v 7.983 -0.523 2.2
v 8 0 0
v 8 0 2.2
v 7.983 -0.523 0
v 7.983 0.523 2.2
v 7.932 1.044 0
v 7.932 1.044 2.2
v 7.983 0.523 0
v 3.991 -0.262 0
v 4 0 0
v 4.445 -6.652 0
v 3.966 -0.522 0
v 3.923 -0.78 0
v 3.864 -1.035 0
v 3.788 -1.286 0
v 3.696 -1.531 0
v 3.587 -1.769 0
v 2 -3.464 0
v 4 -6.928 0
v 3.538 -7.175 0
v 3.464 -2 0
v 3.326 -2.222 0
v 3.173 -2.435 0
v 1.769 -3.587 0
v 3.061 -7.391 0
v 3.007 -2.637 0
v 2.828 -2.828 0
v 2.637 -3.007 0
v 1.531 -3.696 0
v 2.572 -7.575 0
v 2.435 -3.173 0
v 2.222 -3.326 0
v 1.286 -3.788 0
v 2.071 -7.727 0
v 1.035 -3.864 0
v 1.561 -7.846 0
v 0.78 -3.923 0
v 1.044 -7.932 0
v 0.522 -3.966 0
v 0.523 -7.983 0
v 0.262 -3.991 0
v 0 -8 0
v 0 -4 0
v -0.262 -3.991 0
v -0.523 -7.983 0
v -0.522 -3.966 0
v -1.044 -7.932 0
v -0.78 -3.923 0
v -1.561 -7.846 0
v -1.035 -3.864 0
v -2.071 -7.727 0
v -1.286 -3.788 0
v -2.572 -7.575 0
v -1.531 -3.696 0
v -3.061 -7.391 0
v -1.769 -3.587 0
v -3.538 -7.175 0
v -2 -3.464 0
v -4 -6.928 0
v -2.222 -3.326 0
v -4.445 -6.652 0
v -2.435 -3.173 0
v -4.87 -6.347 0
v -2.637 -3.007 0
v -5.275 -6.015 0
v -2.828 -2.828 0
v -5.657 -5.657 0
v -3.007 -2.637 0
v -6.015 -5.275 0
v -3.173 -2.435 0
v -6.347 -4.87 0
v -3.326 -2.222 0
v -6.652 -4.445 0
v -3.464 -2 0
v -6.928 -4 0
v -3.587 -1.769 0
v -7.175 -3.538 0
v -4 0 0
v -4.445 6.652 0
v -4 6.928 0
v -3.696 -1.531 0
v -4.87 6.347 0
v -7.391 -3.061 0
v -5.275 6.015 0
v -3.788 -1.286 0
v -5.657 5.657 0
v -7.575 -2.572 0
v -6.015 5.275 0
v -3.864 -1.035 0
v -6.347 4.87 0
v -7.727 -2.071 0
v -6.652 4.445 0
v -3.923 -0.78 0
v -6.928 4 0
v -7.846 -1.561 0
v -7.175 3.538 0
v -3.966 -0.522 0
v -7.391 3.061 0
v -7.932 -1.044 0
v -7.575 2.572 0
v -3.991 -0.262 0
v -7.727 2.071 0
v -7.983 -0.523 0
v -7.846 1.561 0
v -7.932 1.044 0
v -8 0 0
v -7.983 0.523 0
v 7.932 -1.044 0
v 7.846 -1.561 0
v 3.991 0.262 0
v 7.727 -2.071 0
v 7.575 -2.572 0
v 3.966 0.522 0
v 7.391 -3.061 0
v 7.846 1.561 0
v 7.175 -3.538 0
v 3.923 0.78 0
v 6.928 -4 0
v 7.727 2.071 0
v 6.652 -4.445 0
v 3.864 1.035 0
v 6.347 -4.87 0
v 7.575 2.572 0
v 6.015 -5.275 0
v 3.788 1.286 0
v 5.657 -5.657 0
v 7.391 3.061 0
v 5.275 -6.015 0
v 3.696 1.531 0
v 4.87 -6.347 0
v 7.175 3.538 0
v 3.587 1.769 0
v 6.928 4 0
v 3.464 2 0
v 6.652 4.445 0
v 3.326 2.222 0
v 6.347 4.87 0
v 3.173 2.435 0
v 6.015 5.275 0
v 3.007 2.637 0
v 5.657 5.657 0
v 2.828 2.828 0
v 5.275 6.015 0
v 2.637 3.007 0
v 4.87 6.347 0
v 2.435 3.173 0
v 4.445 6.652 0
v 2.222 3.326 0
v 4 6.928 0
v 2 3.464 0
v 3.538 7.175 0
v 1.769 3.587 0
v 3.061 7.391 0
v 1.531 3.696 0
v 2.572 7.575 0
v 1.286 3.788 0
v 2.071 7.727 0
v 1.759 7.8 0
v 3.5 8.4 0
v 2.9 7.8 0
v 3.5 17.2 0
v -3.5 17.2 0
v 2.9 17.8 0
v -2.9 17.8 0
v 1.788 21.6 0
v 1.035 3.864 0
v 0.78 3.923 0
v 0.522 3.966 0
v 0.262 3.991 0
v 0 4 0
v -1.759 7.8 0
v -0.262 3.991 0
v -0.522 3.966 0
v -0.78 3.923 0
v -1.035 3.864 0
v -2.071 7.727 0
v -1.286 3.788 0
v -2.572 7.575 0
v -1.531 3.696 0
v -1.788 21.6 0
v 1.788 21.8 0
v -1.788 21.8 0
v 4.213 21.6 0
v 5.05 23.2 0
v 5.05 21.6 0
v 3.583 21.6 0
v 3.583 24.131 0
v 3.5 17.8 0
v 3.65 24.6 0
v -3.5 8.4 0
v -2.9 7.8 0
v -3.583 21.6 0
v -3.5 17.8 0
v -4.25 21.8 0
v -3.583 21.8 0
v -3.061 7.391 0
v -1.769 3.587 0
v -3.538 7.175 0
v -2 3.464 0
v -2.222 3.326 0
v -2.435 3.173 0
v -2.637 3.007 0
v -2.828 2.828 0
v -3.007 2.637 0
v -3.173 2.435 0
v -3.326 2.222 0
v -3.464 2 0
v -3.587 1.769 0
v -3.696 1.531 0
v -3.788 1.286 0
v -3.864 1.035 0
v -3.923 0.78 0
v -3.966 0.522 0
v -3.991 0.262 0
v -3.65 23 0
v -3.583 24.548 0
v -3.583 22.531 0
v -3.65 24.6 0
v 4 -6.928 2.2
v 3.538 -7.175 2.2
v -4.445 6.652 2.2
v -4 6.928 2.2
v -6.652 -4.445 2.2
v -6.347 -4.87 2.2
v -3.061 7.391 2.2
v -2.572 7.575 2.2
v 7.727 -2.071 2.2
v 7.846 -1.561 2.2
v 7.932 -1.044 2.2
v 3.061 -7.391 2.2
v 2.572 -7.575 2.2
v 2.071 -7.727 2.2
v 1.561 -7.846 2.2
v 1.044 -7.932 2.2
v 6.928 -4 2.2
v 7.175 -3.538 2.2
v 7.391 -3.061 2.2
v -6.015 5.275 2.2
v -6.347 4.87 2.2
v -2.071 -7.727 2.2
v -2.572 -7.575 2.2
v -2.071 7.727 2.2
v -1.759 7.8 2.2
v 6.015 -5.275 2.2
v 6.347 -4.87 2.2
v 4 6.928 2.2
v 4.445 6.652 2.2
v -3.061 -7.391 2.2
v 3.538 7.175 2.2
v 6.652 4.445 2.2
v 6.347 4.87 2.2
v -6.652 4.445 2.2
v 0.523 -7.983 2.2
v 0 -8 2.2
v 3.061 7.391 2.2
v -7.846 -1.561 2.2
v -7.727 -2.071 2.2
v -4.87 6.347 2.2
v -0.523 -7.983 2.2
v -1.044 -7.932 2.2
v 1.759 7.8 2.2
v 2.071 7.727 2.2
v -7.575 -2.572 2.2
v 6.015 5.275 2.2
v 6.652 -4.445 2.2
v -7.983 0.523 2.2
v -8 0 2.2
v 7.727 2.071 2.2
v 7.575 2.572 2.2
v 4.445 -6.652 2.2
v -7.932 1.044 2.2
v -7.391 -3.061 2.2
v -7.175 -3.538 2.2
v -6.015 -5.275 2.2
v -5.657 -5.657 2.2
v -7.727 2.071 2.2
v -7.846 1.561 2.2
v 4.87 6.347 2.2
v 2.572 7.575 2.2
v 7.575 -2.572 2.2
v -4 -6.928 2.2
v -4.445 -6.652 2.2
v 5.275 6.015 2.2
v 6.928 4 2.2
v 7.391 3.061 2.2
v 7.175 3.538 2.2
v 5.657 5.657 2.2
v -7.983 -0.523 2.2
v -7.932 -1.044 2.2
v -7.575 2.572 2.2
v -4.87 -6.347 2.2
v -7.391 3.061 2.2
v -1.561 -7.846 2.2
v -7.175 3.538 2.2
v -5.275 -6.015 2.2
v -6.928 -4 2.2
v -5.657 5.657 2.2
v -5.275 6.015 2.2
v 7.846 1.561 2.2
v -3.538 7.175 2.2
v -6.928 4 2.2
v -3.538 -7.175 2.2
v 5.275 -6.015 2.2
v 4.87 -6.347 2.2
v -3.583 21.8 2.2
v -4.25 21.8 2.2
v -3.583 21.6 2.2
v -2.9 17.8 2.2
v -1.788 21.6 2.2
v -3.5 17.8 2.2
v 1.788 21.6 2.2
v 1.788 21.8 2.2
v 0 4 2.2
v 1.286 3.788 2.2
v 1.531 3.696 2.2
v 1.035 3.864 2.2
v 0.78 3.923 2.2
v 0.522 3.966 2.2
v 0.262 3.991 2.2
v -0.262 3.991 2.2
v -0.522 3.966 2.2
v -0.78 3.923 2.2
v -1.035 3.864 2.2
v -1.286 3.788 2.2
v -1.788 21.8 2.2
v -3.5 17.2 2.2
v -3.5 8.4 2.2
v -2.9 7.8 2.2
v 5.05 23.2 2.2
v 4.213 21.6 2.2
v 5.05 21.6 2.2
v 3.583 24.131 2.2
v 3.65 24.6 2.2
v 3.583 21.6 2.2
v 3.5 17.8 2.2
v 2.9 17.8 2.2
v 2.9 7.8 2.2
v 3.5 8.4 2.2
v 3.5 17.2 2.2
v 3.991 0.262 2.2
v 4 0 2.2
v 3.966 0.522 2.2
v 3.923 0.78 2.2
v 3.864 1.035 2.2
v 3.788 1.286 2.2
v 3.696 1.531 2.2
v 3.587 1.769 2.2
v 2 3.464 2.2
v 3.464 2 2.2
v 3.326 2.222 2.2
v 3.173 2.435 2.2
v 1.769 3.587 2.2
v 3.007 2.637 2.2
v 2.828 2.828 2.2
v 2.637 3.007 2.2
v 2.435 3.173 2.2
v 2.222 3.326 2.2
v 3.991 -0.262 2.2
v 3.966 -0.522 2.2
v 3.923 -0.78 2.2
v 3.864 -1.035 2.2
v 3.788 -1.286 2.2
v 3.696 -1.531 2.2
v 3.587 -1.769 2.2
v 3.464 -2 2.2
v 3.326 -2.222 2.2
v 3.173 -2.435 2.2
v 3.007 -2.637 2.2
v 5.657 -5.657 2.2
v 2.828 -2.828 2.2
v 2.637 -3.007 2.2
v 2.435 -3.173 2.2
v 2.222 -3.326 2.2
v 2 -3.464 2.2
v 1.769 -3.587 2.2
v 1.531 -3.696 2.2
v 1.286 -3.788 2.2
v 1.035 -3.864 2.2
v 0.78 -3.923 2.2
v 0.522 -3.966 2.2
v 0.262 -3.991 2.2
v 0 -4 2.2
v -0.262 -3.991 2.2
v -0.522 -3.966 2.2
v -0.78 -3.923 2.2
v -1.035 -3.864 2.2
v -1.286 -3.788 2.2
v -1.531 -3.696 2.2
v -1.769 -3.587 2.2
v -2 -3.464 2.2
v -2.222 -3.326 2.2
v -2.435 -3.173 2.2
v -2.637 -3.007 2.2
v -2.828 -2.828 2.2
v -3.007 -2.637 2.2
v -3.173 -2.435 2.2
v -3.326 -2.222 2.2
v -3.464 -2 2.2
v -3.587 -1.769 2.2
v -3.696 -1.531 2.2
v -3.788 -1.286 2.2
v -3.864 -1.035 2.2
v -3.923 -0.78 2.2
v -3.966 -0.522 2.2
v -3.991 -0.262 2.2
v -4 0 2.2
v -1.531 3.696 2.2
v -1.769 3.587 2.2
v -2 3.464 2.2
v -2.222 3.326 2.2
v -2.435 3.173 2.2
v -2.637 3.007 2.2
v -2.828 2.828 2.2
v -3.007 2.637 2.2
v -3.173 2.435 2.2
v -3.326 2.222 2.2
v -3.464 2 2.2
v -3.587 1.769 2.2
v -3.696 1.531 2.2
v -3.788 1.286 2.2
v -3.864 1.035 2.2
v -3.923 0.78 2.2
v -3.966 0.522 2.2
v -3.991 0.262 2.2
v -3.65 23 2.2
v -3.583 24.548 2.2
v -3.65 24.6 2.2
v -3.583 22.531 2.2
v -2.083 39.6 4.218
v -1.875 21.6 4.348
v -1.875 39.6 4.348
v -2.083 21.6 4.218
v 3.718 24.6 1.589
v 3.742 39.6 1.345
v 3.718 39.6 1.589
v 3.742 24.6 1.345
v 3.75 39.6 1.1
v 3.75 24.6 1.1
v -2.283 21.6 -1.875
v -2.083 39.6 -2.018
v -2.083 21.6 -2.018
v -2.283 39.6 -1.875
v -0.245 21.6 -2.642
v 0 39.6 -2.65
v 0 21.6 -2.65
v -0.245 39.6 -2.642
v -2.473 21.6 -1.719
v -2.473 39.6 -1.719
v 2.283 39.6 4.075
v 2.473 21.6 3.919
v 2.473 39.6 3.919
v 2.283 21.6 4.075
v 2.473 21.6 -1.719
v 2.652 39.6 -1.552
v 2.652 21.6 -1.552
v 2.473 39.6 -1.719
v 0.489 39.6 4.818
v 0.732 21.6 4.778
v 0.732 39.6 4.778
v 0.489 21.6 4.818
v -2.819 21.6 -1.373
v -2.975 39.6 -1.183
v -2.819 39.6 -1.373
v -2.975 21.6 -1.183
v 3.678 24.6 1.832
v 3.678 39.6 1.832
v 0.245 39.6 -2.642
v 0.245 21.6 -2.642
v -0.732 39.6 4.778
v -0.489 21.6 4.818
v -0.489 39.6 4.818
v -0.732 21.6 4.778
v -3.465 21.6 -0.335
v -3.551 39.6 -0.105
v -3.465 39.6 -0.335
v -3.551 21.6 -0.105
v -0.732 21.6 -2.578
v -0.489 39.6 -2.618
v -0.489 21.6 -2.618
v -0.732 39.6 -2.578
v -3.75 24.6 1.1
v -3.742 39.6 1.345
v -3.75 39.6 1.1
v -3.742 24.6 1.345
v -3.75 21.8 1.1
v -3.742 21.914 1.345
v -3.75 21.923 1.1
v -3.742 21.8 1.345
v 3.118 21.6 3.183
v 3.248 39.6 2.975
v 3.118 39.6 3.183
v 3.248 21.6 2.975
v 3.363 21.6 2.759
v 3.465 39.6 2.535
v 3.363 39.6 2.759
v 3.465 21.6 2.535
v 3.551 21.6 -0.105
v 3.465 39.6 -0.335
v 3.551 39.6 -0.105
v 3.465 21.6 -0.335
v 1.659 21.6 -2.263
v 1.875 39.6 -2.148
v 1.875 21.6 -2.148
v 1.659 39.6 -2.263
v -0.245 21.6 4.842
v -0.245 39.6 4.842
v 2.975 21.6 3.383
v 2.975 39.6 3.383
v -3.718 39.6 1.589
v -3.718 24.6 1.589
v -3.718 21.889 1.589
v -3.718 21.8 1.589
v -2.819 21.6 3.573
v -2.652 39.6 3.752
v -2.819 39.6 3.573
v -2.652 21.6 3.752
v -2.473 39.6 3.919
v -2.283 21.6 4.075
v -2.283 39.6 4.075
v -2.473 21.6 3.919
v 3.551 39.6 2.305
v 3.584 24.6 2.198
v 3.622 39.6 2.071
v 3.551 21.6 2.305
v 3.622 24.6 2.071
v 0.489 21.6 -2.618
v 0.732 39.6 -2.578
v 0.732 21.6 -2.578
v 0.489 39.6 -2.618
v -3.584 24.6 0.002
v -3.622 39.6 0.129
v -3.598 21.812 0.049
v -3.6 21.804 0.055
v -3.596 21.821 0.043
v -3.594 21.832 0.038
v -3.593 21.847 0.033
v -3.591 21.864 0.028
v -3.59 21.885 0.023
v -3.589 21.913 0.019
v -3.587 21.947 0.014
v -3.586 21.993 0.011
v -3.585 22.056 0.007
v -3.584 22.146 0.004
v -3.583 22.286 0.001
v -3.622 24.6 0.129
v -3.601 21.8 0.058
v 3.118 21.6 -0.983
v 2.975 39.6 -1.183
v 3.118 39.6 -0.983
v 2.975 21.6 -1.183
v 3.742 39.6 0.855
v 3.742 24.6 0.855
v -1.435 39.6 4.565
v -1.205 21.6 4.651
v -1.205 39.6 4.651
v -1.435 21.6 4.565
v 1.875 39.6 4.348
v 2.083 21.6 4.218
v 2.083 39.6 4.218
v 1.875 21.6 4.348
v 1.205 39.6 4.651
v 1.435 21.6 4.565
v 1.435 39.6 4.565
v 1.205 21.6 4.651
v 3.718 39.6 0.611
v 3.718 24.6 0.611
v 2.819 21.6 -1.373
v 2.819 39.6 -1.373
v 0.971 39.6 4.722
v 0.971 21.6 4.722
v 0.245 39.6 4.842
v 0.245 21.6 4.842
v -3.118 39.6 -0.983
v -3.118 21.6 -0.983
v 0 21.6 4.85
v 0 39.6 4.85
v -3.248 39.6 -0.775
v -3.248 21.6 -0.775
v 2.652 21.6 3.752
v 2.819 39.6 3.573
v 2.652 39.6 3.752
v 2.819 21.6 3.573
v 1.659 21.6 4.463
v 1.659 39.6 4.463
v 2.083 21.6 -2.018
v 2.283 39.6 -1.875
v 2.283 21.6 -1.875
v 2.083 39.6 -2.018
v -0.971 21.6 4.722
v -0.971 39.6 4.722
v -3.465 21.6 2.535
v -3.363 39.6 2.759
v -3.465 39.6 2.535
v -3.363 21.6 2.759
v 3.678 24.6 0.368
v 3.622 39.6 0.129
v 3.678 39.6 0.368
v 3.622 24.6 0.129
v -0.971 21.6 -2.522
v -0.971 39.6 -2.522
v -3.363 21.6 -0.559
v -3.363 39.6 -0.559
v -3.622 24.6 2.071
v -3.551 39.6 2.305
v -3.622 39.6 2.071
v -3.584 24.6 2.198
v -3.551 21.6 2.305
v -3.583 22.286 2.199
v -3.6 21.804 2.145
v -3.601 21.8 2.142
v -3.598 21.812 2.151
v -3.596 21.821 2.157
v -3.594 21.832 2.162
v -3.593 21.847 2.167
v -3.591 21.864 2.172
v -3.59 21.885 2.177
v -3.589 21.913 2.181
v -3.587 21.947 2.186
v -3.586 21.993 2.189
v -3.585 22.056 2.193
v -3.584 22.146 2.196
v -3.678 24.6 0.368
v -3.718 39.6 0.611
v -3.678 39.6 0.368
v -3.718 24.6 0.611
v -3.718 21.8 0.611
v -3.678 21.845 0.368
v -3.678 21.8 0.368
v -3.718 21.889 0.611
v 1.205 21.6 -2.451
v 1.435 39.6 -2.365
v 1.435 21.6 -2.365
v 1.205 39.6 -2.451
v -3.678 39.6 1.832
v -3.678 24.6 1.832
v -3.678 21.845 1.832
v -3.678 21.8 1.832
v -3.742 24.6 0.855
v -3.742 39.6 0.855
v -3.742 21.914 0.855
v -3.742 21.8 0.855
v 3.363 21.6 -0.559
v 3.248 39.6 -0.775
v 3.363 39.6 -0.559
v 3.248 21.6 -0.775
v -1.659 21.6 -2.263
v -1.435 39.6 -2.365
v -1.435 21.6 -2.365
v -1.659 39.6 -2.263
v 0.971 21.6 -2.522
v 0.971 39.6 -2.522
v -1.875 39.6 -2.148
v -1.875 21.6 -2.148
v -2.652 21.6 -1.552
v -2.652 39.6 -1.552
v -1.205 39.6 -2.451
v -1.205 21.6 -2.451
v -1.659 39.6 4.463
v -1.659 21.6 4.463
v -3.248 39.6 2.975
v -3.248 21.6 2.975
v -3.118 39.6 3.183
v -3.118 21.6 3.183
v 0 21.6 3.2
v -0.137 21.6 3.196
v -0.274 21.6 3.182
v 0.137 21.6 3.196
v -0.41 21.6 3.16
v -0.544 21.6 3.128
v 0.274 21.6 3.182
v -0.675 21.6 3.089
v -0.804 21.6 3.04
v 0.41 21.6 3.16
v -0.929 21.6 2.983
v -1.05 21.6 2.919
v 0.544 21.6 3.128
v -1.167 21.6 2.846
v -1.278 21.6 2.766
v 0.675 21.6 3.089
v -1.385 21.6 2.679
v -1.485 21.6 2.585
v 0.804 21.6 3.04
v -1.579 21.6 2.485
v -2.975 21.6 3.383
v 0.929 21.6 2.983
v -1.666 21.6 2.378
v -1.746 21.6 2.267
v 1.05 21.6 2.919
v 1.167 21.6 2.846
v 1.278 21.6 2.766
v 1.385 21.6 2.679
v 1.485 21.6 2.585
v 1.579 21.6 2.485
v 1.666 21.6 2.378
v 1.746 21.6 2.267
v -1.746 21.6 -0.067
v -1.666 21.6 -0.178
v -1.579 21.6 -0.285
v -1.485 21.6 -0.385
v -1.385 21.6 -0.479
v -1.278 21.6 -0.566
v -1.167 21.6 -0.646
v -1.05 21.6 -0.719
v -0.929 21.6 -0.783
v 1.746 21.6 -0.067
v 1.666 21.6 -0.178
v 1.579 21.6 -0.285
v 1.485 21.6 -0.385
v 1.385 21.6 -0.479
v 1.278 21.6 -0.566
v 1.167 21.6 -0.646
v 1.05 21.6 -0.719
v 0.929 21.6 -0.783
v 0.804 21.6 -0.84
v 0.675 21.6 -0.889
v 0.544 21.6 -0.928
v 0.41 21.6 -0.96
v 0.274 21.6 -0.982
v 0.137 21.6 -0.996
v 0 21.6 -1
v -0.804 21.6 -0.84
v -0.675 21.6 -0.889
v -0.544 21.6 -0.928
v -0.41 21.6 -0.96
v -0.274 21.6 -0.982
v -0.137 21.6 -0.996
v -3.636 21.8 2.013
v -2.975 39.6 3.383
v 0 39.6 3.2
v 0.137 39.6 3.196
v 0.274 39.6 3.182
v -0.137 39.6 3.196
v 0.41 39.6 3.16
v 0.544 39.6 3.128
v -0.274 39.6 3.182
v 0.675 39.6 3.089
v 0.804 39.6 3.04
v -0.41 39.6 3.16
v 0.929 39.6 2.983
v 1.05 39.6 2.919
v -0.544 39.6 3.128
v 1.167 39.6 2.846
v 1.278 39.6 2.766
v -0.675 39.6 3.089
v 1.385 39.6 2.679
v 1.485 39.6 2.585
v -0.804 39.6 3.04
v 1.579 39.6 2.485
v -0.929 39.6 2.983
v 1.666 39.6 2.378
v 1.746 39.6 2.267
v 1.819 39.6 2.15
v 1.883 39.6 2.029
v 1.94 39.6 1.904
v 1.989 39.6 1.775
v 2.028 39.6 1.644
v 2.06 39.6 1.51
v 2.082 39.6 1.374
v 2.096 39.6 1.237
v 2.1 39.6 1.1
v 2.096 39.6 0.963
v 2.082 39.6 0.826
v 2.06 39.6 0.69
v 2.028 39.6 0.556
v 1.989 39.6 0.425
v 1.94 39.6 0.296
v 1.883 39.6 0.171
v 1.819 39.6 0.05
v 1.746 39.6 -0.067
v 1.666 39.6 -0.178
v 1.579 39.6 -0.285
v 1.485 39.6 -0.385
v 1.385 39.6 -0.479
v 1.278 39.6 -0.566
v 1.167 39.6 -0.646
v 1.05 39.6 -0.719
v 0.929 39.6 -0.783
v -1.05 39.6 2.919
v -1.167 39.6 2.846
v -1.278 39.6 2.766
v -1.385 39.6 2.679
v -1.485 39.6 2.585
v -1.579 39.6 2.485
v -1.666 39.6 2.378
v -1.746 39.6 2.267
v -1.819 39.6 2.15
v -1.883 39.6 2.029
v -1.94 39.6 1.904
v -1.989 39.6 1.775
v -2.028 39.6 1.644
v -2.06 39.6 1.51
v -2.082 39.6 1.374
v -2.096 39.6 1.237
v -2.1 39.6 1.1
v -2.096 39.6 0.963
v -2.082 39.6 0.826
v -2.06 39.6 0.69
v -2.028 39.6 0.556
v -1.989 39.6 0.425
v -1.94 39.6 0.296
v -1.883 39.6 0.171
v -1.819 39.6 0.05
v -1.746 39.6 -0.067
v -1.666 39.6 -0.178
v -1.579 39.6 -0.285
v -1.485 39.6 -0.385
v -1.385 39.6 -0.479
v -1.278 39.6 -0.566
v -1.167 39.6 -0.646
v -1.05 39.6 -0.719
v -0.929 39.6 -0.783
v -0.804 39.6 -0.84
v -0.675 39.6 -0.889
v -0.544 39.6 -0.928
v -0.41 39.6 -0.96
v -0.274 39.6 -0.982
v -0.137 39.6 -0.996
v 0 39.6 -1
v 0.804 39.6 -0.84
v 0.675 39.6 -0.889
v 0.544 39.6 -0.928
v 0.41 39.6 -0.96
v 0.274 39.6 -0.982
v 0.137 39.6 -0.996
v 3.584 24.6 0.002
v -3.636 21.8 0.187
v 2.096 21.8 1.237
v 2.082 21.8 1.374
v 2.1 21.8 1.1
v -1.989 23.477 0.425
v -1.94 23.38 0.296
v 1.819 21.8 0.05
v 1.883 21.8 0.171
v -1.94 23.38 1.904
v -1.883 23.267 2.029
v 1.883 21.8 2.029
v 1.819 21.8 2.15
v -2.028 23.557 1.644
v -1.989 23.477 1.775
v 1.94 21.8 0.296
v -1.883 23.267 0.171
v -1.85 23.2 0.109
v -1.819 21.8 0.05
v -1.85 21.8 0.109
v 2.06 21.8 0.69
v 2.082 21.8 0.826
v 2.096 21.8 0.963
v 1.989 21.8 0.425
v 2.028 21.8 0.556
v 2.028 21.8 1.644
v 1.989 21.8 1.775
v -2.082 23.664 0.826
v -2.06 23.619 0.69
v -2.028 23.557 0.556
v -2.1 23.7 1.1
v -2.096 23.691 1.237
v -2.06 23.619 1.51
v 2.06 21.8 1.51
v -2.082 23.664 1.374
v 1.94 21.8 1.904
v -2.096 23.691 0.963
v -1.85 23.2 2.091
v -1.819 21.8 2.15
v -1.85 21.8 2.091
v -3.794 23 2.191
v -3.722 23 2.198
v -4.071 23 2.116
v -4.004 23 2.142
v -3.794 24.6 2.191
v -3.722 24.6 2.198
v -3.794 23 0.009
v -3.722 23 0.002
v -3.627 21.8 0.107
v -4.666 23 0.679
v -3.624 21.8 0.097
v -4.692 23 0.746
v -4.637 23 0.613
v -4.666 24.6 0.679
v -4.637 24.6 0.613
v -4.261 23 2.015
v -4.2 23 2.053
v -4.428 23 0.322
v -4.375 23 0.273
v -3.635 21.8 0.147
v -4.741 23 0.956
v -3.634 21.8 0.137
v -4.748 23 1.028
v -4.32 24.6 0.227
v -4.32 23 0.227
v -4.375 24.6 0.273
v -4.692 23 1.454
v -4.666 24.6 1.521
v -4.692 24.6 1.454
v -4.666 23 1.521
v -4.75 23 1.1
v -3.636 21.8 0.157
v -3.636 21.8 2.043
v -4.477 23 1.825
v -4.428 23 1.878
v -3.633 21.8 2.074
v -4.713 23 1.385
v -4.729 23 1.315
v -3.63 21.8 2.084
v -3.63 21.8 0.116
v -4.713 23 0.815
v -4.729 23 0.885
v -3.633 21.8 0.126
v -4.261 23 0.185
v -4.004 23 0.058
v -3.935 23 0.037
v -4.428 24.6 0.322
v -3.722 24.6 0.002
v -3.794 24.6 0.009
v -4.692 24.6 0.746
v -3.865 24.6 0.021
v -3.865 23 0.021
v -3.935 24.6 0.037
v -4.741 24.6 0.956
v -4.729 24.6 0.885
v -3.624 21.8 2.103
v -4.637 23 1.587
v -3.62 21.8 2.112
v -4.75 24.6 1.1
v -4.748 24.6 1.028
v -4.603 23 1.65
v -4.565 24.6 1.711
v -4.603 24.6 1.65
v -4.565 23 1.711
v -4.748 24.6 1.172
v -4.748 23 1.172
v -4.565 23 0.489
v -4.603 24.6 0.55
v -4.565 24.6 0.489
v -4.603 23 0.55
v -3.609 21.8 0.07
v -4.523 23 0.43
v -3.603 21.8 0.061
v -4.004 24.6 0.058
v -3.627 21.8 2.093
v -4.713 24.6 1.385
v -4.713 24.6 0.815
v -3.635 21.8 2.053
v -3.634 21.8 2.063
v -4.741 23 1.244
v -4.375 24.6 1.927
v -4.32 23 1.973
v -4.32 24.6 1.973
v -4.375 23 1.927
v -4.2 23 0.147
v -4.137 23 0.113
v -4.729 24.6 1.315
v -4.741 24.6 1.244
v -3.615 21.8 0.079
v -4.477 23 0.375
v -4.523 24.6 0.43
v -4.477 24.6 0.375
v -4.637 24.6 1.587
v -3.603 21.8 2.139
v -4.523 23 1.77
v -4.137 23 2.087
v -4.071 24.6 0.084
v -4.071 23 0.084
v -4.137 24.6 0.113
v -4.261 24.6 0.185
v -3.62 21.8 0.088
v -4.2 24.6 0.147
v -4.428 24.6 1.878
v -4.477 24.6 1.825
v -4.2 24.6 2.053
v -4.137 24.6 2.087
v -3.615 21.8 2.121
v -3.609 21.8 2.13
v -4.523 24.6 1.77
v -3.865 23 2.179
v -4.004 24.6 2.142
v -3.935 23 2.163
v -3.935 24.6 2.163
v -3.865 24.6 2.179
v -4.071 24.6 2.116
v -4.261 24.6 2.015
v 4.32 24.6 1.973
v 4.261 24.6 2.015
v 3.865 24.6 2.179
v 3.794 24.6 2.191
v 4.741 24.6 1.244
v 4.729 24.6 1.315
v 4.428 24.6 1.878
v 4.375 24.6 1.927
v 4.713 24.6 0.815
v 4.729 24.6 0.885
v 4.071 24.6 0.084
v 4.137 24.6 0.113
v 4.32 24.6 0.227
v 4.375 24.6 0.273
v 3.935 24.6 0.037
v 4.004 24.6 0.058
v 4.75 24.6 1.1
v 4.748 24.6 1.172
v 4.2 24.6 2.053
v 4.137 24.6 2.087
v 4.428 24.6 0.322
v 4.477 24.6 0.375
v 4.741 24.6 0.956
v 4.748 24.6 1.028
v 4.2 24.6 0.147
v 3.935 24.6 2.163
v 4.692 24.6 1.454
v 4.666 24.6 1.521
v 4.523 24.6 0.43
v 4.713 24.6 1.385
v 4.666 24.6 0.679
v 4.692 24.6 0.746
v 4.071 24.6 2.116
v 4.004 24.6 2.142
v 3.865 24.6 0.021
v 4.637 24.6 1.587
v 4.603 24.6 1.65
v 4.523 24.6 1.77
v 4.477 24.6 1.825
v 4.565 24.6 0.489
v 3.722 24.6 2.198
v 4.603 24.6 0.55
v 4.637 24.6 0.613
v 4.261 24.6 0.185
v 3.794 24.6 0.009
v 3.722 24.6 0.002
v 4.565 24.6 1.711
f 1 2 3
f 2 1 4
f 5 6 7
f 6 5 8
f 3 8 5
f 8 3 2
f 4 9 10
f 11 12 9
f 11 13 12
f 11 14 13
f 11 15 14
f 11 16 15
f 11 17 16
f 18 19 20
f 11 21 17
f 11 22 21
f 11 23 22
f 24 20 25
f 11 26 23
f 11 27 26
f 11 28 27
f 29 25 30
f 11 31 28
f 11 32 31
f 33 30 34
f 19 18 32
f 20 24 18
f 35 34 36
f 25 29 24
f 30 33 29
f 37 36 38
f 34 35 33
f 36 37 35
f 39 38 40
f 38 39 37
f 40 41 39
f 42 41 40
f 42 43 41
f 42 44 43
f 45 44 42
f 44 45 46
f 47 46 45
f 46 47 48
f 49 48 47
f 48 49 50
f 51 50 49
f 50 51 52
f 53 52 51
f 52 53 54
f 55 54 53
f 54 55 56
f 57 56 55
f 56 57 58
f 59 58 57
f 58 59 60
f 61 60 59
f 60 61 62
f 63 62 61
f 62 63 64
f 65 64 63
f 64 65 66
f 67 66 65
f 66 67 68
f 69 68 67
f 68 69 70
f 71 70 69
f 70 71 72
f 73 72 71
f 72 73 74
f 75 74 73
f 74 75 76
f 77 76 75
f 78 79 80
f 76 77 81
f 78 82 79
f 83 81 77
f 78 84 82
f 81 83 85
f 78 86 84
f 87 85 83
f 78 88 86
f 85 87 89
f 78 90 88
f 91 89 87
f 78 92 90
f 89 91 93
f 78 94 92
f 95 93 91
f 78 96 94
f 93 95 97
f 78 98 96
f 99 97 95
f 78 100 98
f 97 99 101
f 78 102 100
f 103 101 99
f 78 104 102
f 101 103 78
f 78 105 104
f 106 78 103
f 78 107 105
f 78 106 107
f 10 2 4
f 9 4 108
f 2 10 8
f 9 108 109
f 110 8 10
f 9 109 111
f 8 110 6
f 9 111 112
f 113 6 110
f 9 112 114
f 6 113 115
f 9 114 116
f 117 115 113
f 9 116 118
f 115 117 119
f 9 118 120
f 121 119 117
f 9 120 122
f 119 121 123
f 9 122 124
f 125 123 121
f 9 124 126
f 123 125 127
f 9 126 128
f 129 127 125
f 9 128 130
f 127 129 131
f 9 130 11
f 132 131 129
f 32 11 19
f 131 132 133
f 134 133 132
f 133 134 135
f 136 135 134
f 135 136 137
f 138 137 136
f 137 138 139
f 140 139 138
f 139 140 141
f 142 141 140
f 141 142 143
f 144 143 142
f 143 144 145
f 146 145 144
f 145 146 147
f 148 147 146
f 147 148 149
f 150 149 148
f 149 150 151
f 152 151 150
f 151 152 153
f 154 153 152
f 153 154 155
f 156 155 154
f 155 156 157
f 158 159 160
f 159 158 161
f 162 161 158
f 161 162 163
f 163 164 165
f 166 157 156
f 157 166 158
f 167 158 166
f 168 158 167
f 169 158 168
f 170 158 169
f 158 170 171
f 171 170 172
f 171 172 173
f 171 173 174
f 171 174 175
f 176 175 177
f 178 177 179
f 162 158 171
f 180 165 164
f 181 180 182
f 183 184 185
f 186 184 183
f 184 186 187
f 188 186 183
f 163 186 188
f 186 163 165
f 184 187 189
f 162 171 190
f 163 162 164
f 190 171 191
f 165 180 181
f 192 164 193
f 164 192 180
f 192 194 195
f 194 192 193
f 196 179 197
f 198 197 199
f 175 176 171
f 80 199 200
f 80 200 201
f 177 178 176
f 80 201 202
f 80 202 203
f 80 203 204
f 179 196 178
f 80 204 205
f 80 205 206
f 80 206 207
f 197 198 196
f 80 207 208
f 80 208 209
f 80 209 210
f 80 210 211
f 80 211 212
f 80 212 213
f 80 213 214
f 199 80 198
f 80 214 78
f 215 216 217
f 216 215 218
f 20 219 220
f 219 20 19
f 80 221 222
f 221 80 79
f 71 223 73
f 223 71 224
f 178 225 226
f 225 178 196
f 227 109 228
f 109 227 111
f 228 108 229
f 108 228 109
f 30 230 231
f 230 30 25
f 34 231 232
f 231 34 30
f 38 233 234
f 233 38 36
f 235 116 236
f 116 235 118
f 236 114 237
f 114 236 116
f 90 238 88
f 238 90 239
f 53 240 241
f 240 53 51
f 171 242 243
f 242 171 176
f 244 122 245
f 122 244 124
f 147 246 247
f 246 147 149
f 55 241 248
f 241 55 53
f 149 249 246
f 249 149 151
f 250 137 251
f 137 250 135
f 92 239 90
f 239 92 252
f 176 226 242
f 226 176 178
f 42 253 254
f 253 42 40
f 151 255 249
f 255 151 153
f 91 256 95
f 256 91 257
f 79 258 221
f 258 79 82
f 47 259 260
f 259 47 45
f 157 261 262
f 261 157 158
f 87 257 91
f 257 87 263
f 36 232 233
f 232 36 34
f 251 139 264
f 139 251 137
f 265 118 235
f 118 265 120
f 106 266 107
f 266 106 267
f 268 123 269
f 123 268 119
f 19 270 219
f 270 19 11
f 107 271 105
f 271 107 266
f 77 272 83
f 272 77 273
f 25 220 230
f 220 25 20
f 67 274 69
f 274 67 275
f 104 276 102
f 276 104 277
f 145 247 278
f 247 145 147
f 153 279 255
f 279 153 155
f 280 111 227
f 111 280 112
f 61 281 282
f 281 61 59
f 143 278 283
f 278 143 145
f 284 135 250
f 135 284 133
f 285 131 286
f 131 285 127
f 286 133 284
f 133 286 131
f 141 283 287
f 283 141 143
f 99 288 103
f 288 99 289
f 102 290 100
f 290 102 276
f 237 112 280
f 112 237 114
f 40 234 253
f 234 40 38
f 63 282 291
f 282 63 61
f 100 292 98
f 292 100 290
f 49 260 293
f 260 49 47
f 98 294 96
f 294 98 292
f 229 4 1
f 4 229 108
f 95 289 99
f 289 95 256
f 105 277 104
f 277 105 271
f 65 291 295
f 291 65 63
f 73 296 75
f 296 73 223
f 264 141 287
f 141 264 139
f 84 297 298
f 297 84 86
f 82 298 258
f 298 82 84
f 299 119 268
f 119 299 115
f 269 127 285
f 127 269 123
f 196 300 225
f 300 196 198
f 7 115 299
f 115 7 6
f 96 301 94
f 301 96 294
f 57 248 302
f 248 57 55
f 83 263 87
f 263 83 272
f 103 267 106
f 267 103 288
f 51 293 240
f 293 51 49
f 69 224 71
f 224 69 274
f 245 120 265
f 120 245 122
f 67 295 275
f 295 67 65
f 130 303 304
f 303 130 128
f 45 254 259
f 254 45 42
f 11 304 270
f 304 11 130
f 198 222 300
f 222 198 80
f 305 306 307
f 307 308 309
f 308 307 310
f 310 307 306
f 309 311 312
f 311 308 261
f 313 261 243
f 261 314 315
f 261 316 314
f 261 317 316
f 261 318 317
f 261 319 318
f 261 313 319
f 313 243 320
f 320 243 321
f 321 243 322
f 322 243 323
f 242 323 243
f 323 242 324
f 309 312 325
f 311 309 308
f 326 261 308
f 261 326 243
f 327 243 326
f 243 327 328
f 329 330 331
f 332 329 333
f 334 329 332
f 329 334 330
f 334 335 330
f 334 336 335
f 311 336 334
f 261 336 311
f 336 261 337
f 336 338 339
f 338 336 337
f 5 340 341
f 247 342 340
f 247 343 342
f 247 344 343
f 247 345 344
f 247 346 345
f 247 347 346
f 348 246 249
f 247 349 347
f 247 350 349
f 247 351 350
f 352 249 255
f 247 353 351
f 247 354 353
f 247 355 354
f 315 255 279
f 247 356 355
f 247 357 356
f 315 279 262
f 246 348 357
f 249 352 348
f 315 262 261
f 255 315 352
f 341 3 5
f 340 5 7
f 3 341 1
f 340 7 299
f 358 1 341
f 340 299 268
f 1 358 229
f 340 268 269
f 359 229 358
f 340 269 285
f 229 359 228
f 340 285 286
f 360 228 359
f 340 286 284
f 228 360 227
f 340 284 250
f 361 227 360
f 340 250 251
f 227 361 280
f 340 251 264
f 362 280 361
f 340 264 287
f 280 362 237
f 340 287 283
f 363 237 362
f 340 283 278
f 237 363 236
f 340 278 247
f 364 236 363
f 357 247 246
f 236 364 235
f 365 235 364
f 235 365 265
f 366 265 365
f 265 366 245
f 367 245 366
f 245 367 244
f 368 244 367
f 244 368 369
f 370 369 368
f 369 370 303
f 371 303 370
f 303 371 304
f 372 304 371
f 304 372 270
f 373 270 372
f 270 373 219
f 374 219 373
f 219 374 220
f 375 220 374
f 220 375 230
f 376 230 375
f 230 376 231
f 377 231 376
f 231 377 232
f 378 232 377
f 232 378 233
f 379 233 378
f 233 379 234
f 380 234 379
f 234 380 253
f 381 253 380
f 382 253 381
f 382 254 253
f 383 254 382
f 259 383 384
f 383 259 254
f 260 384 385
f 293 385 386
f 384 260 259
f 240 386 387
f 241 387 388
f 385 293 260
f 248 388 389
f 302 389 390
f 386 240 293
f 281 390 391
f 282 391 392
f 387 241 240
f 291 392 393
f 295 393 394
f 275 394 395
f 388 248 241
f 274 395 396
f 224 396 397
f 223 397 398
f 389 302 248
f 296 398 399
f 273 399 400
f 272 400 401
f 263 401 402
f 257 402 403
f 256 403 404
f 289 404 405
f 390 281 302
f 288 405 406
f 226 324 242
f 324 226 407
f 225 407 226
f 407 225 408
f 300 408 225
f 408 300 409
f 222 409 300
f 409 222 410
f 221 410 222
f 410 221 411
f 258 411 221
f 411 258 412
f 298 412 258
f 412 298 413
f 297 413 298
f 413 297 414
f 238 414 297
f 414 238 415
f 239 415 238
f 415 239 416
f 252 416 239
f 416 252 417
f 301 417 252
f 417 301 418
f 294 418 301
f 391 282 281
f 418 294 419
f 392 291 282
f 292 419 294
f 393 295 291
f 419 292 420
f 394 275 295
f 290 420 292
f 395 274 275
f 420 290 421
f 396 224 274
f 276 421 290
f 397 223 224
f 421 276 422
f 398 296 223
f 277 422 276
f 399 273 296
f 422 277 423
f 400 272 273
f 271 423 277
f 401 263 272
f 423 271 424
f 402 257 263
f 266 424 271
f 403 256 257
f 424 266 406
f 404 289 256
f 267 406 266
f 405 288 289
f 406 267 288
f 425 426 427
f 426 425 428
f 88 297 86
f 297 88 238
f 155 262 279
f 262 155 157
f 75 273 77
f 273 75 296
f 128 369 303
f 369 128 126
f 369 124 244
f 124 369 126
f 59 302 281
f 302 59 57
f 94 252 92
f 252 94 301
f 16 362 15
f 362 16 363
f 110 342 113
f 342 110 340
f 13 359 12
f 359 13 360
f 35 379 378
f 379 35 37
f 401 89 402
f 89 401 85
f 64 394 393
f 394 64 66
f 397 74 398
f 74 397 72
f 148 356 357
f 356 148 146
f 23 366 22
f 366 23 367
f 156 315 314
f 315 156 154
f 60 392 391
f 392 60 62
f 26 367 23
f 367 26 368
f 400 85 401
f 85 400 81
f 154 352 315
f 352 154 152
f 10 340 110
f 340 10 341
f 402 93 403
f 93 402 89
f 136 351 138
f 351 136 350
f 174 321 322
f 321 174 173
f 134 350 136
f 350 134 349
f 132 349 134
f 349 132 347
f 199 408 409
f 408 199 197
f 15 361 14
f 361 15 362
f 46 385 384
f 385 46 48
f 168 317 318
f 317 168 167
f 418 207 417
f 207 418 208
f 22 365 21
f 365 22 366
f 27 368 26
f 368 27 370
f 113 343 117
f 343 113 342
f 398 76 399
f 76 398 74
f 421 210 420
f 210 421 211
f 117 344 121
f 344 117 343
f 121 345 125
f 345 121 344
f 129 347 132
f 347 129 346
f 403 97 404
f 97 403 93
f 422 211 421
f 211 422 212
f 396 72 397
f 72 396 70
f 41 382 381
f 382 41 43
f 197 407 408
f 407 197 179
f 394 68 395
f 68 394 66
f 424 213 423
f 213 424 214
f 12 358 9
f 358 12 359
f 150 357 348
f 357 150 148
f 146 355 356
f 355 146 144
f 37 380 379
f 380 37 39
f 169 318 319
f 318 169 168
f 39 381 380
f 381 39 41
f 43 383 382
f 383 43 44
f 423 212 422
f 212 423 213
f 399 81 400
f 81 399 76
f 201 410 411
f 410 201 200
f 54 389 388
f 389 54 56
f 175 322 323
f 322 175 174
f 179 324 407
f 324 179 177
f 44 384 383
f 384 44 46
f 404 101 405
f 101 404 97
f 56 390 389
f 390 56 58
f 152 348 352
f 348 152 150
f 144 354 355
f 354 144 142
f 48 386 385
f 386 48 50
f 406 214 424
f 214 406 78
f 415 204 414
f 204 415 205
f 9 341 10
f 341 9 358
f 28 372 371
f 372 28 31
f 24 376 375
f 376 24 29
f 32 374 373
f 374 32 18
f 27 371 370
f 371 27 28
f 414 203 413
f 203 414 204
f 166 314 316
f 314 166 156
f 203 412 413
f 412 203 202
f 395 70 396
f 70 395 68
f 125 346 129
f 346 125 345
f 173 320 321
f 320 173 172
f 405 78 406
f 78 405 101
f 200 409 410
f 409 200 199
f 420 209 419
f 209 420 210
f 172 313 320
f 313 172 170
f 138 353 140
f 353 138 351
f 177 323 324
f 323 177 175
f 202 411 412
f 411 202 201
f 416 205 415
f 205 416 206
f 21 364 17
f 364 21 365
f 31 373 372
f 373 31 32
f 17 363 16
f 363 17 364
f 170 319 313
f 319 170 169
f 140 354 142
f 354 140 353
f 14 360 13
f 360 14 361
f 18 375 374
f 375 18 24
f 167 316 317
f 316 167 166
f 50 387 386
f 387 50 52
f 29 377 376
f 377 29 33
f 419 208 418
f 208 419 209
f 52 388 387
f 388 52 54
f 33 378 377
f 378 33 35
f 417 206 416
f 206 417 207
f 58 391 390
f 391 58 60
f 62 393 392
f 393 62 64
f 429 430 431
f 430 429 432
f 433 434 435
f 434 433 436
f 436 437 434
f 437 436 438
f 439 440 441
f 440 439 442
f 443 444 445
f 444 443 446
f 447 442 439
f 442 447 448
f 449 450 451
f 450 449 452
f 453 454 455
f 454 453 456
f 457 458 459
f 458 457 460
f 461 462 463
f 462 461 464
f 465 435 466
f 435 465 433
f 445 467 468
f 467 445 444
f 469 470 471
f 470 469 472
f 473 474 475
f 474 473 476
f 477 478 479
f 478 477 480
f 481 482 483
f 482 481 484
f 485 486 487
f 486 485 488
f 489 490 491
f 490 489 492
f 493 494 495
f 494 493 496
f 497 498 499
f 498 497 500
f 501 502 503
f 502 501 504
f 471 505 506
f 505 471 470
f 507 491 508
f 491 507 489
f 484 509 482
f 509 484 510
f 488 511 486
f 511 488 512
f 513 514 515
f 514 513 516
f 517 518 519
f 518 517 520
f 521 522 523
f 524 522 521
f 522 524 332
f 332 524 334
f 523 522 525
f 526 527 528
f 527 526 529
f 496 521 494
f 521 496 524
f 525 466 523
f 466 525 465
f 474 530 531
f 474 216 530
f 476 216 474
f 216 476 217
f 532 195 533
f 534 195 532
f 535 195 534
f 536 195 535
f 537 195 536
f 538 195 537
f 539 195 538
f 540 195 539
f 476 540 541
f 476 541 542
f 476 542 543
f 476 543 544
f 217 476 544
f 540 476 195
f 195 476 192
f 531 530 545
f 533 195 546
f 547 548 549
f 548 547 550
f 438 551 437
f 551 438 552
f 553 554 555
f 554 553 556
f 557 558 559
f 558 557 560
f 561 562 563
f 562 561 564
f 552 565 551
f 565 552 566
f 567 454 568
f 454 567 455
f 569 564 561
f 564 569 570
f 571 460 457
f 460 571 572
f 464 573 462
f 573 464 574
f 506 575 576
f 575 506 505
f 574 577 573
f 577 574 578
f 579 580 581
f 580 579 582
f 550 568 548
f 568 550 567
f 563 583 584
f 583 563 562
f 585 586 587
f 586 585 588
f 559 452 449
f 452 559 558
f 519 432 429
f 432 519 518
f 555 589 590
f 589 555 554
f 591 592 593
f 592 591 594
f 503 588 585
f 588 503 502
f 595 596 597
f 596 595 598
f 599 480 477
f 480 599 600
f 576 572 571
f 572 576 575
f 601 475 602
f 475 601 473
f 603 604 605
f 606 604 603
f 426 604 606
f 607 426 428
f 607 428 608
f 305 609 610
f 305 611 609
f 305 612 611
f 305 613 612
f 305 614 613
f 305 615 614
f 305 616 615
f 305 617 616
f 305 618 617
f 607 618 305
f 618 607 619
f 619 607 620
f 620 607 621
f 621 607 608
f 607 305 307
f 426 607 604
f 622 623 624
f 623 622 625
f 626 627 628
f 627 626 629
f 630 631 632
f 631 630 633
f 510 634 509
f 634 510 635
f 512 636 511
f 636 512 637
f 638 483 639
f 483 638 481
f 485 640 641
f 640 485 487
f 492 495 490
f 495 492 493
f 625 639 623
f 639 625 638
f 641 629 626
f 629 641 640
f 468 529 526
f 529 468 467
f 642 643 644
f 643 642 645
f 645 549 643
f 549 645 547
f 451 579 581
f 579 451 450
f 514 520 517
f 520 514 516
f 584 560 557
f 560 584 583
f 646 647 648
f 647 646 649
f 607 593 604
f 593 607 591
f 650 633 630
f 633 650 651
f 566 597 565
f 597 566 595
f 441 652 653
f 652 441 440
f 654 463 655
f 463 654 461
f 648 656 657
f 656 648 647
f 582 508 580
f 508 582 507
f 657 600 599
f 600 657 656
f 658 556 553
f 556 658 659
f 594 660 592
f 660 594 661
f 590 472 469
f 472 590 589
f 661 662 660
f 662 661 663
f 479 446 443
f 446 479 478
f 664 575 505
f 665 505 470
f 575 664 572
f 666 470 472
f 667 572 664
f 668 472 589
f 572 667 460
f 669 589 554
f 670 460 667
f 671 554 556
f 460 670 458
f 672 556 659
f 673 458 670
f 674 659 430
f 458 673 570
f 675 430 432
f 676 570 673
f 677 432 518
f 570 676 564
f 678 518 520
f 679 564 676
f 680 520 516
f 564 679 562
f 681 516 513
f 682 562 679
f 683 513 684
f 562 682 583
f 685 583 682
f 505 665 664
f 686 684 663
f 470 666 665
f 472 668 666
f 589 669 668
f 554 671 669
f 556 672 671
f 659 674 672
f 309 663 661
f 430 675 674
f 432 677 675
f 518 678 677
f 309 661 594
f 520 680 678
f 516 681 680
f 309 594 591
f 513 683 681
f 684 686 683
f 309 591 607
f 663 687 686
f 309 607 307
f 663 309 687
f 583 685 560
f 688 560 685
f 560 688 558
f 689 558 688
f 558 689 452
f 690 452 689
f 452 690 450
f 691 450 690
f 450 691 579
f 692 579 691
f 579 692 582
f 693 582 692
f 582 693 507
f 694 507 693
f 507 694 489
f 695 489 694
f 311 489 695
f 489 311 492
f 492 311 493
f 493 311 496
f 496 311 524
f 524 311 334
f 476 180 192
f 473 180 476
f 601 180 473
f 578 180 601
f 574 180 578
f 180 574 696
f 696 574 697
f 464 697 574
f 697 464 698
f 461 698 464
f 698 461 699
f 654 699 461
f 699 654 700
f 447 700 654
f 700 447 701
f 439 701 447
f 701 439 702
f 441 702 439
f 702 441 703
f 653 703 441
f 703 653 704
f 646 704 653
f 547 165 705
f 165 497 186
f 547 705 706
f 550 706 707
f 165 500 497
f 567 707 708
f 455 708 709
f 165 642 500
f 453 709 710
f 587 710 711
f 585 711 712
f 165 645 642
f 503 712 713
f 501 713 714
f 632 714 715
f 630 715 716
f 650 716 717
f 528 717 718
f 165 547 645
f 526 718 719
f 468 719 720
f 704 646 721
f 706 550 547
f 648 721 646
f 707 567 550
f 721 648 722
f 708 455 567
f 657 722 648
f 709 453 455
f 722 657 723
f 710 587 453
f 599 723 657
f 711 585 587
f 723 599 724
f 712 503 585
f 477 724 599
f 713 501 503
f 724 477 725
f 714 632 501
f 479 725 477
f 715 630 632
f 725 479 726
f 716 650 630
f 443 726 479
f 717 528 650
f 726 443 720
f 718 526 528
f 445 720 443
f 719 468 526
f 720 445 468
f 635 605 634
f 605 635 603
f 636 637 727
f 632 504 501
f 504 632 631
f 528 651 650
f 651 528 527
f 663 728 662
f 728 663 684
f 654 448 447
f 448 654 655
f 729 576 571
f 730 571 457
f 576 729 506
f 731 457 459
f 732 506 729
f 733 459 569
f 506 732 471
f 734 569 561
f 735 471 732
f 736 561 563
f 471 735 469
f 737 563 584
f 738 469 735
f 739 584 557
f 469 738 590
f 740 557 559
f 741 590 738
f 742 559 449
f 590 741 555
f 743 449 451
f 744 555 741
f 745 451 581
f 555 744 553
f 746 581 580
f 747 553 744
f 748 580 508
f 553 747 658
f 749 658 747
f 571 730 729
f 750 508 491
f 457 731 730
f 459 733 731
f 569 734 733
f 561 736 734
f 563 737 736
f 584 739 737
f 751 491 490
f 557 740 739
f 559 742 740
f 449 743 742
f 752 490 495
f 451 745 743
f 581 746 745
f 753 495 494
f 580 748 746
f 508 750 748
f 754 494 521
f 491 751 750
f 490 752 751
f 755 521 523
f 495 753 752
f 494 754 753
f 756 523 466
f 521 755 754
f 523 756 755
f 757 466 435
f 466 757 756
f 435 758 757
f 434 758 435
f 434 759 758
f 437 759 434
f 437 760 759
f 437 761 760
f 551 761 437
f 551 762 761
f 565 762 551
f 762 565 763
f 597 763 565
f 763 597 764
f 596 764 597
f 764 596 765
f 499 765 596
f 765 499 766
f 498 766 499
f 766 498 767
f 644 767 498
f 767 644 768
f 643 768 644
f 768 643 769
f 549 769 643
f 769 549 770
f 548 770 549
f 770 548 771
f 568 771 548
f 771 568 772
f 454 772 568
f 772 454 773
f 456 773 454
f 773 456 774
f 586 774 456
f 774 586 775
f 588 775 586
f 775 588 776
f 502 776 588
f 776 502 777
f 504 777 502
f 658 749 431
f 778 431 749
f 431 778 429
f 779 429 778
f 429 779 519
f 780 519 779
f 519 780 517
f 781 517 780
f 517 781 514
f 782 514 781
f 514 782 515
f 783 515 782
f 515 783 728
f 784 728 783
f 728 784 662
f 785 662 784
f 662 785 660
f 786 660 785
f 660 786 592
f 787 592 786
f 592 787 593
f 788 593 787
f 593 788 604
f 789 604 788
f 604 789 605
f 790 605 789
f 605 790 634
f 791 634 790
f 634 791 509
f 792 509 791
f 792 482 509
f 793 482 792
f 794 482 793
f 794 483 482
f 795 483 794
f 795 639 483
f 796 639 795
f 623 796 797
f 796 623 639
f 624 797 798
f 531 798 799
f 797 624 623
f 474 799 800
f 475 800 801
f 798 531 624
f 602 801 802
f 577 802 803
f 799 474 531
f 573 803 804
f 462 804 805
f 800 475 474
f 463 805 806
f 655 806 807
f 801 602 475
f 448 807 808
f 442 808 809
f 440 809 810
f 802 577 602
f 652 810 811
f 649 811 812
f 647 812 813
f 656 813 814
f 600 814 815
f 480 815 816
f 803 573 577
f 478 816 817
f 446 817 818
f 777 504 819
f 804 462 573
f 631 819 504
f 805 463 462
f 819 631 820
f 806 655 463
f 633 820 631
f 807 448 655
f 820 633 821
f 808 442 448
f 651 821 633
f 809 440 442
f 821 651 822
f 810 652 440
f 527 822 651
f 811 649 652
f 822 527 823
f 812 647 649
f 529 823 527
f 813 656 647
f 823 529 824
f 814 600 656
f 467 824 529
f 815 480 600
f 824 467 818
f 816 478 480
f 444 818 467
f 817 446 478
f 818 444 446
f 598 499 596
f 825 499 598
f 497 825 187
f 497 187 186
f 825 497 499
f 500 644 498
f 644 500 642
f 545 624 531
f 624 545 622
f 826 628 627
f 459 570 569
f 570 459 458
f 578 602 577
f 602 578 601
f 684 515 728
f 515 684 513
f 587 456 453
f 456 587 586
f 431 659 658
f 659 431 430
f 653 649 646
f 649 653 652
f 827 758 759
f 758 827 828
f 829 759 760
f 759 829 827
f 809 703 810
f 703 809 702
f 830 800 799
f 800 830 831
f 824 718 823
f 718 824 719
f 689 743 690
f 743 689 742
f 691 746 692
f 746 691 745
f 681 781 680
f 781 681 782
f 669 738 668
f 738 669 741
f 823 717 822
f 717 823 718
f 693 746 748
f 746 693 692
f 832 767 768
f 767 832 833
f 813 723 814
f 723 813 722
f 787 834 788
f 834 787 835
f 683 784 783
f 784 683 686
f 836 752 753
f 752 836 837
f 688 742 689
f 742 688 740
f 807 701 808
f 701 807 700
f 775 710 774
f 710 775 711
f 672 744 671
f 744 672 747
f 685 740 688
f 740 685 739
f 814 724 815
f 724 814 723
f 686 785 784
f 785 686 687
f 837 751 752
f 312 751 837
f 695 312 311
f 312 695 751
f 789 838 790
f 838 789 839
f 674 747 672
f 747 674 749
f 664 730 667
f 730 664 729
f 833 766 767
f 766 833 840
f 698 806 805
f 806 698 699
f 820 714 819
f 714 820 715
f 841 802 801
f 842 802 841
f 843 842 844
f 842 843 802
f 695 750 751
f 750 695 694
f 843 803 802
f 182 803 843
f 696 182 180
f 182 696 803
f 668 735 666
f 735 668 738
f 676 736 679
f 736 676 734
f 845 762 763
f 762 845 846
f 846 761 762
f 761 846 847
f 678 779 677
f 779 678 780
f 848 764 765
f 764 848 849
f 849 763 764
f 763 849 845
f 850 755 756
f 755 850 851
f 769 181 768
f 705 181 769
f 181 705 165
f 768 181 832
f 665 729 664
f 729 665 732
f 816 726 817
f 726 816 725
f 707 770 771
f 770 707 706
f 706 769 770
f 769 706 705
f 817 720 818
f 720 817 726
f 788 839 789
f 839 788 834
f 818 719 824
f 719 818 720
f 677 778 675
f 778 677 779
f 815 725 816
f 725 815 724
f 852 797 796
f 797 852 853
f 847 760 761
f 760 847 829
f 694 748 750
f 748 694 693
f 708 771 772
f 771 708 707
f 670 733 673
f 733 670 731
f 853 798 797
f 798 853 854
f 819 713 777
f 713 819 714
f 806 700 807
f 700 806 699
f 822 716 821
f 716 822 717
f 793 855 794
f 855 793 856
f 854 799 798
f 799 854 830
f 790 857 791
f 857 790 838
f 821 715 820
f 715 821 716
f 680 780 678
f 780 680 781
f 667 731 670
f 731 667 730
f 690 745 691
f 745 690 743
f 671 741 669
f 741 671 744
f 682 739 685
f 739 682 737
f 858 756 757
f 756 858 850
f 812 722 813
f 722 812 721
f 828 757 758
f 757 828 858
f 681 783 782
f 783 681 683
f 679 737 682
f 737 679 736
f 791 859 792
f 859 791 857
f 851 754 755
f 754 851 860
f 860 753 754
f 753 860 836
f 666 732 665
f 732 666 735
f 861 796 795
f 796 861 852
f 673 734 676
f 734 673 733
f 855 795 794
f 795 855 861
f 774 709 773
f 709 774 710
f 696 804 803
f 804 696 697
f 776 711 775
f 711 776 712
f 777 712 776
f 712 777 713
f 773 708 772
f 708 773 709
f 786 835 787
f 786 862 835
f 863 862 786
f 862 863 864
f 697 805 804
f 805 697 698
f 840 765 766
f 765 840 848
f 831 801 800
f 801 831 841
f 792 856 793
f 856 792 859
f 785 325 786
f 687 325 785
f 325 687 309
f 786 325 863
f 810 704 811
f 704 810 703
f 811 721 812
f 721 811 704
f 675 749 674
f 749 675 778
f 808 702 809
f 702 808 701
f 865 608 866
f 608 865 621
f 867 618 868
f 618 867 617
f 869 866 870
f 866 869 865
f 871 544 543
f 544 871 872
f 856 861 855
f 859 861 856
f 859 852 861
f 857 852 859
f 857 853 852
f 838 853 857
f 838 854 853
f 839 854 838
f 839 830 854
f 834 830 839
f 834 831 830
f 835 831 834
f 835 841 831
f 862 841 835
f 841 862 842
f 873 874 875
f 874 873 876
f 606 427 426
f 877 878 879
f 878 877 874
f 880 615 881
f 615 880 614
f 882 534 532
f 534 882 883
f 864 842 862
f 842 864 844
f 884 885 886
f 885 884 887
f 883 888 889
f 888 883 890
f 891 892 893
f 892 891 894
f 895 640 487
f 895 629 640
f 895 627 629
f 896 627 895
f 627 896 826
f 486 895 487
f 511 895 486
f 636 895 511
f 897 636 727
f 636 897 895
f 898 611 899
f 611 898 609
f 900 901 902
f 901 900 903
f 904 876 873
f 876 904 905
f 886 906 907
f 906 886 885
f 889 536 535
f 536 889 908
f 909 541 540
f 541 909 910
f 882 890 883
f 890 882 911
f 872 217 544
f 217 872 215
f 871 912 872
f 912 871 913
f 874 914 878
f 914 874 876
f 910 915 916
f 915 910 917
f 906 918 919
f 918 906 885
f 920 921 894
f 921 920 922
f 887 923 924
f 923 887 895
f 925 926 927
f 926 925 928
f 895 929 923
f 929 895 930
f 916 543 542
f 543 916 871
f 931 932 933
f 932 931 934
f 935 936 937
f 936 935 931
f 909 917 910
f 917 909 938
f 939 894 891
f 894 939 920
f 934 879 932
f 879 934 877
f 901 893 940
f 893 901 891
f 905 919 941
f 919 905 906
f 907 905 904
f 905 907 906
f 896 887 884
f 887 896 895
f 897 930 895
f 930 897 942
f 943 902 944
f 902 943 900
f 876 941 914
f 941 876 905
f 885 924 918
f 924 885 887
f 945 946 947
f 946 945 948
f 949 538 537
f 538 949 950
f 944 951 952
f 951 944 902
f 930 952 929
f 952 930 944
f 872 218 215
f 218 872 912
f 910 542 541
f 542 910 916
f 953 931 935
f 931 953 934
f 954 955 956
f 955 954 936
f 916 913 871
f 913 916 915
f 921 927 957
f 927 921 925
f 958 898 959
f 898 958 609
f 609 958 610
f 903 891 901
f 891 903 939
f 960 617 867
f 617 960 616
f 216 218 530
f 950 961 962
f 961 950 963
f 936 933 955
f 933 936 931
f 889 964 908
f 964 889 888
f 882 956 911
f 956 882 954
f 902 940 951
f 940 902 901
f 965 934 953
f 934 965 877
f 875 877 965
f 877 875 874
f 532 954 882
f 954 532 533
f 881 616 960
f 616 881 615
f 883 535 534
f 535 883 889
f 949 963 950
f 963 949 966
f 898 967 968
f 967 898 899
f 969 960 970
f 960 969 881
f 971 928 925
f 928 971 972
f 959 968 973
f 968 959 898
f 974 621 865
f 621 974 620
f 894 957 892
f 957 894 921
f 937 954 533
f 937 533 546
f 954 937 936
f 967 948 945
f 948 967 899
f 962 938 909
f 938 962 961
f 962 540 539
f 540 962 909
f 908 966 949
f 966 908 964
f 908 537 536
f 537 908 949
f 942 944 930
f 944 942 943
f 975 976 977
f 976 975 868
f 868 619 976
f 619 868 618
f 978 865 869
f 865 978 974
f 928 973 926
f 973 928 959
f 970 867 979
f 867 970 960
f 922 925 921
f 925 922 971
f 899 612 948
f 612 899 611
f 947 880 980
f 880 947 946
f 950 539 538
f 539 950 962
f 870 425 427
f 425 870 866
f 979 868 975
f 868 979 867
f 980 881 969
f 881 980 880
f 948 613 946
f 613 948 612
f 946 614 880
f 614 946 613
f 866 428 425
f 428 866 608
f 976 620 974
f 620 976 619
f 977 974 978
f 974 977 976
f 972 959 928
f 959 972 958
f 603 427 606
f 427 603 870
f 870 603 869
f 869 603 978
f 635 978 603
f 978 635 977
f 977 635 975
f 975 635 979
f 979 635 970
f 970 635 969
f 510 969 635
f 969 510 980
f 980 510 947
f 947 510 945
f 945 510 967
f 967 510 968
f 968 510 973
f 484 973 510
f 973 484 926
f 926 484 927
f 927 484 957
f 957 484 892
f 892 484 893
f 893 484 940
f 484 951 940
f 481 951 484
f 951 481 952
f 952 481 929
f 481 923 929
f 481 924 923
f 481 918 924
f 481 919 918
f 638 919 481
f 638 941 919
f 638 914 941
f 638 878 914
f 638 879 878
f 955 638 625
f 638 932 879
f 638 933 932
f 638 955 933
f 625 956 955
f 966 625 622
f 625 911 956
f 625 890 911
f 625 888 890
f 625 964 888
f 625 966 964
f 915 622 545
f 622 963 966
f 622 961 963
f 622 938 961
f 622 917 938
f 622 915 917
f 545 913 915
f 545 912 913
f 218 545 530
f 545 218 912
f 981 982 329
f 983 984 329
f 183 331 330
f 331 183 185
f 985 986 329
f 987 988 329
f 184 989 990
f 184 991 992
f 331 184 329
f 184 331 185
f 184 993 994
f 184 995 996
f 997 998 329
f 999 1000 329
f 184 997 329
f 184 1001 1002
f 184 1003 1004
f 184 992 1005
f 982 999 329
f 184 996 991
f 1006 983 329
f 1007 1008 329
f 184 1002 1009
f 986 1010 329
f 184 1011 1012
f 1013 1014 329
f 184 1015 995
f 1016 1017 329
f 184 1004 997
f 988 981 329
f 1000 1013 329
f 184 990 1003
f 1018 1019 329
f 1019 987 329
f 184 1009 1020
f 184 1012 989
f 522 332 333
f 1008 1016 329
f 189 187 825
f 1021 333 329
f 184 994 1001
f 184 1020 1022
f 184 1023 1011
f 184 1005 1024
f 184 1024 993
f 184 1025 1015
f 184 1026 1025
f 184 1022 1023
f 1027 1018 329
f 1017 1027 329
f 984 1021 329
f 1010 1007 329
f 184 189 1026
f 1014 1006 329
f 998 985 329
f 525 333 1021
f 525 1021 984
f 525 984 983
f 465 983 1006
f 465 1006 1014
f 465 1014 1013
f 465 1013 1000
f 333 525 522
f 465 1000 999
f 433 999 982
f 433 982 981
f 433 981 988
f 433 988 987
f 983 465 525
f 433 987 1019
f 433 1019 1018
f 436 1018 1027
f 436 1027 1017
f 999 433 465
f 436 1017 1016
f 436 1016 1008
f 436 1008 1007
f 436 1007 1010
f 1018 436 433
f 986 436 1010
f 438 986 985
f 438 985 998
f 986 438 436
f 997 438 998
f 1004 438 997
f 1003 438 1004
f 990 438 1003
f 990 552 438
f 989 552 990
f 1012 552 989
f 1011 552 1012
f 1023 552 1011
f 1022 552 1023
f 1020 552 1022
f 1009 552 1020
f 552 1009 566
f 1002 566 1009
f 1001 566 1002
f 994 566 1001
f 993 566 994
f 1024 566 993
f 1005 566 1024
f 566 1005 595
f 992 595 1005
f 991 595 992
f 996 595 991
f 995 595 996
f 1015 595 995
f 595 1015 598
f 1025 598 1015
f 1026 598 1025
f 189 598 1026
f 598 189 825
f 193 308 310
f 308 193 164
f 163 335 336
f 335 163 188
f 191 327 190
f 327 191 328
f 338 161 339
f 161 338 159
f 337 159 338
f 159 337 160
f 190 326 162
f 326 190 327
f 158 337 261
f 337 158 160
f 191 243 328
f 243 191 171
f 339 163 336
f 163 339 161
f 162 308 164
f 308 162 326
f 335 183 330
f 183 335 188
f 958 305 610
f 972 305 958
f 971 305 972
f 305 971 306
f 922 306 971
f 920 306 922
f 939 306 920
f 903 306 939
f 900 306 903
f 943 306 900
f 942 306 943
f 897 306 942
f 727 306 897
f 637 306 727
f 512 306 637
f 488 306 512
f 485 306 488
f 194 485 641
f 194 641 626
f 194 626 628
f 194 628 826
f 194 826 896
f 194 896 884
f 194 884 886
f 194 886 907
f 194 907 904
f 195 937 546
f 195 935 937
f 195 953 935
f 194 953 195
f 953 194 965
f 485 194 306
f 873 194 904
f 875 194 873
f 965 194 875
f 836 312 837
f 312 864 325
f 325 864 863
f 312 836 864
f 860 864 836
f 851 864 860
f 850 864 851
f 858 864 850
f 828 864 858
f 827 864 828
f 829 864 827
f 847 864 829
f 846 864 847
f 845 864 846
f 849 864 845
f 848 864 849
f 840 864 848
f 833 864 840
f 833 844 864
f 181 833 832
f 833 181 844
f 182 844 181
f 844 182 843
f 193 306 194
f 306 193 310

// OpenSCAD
$fn=96;

// Ring terminal parameters (mm)
ring_outer_d = 16;
ring_inner_d = 8;
ring_thickness = 2.2;

neck_length = 10;
neck_width  = 7;
neck_thickness = ring_thickness;

barrel_length = 18;
barrel_outer_d = 7.5;
barrel_inner_d = 4.2;

flare_length = 4;          // transition from neck to barrel
flare_width  = 8.5;        // width at barrel end of flare

// Small edge rounding (visual)
edge_chamfer = 0.6;

module chamfered_plate_2d(w, l, c){
    // 2D rectangle with chamfered corners (approx)
    c2 = min(c, min(w,l)/2 - 0.01);
    polygon(points=[
        [-w/2 + c2, -l/2],
        [ w/2 - c2, -l/2],
        [ w/2, -l/2 + c2],
        [ w/2,  l/2 - c2],
        [ w/2 - c2,  l/2],
        [-w/2 + c2,  l/2],
        [-w/2,  l/2 - c2],
        [-w/2, -l/2 + c2]
    ]);
}

module ring_terminal(){
    union(){
        // Ring pad
        difference(){
            cylinder(h=ring_thickness, d=ring_outer_d);
            translate([0,0,-0.2]) cylinder(h=ring_thickness+0.4, d=ring_inner_d);
        }

        // Neck (flat strap)
        translate([0, (ring_outer_d/2) + neck_length/2 - 0.2, 0])
            linear_extrude(height=neck_thickness)
                chamfered_plate_2d(neck_width, neck_length, edge_chamfer);

        // Flare transition (flat)
        translate([0, (ring_outer_d/2) + neck_length - 0.2 + flare_length/2, 0])
            linear_extrude(height=neck_thickness)
                polygon(points=[
                    [-neck_width/2, -flare_length/2],
                    [ neck_width/2, -flare_length/2],
                    [ flare_width/2,  flare_length/2],
                    [-flare_width/2,  flare_length/2]
                ]);

        // Barrel (tube) aligned along +Y
        translate([0, (ring_outer_d/2) + neck_length - 0.2 + flare_length - 0.2 + barrel_length/2, ring_thickness/2])
            rotate([90,0,0])
                difference(){
                    cylinder(h=barrel_length, d=barrel_outer_d, center=true);
                    cylinder(h=barrel_length+0.6, d=barrel_inner_d, center=true);
                }

        // Small fillet-like gussets between flare and barrel (simple wedges)
        for (sx=[-1,1]){
            translate([sx*(flare_width/2 - 0.8), (ring_outer_d/2) + neck_length - 0.2 + flare_length - 0.2, 0])
                hull(){
                    translate([0,0,0])
                        cube([1.6, 1.6, ring_thickness], center=false);
                    translate([sx*0.2, 3.0, ring_thickness/2])
                        rotate([90,0,0])
                            cylinder(h=1.6, d=2.2, center=false);
                }
        }
    }
}

ring_terminal();
